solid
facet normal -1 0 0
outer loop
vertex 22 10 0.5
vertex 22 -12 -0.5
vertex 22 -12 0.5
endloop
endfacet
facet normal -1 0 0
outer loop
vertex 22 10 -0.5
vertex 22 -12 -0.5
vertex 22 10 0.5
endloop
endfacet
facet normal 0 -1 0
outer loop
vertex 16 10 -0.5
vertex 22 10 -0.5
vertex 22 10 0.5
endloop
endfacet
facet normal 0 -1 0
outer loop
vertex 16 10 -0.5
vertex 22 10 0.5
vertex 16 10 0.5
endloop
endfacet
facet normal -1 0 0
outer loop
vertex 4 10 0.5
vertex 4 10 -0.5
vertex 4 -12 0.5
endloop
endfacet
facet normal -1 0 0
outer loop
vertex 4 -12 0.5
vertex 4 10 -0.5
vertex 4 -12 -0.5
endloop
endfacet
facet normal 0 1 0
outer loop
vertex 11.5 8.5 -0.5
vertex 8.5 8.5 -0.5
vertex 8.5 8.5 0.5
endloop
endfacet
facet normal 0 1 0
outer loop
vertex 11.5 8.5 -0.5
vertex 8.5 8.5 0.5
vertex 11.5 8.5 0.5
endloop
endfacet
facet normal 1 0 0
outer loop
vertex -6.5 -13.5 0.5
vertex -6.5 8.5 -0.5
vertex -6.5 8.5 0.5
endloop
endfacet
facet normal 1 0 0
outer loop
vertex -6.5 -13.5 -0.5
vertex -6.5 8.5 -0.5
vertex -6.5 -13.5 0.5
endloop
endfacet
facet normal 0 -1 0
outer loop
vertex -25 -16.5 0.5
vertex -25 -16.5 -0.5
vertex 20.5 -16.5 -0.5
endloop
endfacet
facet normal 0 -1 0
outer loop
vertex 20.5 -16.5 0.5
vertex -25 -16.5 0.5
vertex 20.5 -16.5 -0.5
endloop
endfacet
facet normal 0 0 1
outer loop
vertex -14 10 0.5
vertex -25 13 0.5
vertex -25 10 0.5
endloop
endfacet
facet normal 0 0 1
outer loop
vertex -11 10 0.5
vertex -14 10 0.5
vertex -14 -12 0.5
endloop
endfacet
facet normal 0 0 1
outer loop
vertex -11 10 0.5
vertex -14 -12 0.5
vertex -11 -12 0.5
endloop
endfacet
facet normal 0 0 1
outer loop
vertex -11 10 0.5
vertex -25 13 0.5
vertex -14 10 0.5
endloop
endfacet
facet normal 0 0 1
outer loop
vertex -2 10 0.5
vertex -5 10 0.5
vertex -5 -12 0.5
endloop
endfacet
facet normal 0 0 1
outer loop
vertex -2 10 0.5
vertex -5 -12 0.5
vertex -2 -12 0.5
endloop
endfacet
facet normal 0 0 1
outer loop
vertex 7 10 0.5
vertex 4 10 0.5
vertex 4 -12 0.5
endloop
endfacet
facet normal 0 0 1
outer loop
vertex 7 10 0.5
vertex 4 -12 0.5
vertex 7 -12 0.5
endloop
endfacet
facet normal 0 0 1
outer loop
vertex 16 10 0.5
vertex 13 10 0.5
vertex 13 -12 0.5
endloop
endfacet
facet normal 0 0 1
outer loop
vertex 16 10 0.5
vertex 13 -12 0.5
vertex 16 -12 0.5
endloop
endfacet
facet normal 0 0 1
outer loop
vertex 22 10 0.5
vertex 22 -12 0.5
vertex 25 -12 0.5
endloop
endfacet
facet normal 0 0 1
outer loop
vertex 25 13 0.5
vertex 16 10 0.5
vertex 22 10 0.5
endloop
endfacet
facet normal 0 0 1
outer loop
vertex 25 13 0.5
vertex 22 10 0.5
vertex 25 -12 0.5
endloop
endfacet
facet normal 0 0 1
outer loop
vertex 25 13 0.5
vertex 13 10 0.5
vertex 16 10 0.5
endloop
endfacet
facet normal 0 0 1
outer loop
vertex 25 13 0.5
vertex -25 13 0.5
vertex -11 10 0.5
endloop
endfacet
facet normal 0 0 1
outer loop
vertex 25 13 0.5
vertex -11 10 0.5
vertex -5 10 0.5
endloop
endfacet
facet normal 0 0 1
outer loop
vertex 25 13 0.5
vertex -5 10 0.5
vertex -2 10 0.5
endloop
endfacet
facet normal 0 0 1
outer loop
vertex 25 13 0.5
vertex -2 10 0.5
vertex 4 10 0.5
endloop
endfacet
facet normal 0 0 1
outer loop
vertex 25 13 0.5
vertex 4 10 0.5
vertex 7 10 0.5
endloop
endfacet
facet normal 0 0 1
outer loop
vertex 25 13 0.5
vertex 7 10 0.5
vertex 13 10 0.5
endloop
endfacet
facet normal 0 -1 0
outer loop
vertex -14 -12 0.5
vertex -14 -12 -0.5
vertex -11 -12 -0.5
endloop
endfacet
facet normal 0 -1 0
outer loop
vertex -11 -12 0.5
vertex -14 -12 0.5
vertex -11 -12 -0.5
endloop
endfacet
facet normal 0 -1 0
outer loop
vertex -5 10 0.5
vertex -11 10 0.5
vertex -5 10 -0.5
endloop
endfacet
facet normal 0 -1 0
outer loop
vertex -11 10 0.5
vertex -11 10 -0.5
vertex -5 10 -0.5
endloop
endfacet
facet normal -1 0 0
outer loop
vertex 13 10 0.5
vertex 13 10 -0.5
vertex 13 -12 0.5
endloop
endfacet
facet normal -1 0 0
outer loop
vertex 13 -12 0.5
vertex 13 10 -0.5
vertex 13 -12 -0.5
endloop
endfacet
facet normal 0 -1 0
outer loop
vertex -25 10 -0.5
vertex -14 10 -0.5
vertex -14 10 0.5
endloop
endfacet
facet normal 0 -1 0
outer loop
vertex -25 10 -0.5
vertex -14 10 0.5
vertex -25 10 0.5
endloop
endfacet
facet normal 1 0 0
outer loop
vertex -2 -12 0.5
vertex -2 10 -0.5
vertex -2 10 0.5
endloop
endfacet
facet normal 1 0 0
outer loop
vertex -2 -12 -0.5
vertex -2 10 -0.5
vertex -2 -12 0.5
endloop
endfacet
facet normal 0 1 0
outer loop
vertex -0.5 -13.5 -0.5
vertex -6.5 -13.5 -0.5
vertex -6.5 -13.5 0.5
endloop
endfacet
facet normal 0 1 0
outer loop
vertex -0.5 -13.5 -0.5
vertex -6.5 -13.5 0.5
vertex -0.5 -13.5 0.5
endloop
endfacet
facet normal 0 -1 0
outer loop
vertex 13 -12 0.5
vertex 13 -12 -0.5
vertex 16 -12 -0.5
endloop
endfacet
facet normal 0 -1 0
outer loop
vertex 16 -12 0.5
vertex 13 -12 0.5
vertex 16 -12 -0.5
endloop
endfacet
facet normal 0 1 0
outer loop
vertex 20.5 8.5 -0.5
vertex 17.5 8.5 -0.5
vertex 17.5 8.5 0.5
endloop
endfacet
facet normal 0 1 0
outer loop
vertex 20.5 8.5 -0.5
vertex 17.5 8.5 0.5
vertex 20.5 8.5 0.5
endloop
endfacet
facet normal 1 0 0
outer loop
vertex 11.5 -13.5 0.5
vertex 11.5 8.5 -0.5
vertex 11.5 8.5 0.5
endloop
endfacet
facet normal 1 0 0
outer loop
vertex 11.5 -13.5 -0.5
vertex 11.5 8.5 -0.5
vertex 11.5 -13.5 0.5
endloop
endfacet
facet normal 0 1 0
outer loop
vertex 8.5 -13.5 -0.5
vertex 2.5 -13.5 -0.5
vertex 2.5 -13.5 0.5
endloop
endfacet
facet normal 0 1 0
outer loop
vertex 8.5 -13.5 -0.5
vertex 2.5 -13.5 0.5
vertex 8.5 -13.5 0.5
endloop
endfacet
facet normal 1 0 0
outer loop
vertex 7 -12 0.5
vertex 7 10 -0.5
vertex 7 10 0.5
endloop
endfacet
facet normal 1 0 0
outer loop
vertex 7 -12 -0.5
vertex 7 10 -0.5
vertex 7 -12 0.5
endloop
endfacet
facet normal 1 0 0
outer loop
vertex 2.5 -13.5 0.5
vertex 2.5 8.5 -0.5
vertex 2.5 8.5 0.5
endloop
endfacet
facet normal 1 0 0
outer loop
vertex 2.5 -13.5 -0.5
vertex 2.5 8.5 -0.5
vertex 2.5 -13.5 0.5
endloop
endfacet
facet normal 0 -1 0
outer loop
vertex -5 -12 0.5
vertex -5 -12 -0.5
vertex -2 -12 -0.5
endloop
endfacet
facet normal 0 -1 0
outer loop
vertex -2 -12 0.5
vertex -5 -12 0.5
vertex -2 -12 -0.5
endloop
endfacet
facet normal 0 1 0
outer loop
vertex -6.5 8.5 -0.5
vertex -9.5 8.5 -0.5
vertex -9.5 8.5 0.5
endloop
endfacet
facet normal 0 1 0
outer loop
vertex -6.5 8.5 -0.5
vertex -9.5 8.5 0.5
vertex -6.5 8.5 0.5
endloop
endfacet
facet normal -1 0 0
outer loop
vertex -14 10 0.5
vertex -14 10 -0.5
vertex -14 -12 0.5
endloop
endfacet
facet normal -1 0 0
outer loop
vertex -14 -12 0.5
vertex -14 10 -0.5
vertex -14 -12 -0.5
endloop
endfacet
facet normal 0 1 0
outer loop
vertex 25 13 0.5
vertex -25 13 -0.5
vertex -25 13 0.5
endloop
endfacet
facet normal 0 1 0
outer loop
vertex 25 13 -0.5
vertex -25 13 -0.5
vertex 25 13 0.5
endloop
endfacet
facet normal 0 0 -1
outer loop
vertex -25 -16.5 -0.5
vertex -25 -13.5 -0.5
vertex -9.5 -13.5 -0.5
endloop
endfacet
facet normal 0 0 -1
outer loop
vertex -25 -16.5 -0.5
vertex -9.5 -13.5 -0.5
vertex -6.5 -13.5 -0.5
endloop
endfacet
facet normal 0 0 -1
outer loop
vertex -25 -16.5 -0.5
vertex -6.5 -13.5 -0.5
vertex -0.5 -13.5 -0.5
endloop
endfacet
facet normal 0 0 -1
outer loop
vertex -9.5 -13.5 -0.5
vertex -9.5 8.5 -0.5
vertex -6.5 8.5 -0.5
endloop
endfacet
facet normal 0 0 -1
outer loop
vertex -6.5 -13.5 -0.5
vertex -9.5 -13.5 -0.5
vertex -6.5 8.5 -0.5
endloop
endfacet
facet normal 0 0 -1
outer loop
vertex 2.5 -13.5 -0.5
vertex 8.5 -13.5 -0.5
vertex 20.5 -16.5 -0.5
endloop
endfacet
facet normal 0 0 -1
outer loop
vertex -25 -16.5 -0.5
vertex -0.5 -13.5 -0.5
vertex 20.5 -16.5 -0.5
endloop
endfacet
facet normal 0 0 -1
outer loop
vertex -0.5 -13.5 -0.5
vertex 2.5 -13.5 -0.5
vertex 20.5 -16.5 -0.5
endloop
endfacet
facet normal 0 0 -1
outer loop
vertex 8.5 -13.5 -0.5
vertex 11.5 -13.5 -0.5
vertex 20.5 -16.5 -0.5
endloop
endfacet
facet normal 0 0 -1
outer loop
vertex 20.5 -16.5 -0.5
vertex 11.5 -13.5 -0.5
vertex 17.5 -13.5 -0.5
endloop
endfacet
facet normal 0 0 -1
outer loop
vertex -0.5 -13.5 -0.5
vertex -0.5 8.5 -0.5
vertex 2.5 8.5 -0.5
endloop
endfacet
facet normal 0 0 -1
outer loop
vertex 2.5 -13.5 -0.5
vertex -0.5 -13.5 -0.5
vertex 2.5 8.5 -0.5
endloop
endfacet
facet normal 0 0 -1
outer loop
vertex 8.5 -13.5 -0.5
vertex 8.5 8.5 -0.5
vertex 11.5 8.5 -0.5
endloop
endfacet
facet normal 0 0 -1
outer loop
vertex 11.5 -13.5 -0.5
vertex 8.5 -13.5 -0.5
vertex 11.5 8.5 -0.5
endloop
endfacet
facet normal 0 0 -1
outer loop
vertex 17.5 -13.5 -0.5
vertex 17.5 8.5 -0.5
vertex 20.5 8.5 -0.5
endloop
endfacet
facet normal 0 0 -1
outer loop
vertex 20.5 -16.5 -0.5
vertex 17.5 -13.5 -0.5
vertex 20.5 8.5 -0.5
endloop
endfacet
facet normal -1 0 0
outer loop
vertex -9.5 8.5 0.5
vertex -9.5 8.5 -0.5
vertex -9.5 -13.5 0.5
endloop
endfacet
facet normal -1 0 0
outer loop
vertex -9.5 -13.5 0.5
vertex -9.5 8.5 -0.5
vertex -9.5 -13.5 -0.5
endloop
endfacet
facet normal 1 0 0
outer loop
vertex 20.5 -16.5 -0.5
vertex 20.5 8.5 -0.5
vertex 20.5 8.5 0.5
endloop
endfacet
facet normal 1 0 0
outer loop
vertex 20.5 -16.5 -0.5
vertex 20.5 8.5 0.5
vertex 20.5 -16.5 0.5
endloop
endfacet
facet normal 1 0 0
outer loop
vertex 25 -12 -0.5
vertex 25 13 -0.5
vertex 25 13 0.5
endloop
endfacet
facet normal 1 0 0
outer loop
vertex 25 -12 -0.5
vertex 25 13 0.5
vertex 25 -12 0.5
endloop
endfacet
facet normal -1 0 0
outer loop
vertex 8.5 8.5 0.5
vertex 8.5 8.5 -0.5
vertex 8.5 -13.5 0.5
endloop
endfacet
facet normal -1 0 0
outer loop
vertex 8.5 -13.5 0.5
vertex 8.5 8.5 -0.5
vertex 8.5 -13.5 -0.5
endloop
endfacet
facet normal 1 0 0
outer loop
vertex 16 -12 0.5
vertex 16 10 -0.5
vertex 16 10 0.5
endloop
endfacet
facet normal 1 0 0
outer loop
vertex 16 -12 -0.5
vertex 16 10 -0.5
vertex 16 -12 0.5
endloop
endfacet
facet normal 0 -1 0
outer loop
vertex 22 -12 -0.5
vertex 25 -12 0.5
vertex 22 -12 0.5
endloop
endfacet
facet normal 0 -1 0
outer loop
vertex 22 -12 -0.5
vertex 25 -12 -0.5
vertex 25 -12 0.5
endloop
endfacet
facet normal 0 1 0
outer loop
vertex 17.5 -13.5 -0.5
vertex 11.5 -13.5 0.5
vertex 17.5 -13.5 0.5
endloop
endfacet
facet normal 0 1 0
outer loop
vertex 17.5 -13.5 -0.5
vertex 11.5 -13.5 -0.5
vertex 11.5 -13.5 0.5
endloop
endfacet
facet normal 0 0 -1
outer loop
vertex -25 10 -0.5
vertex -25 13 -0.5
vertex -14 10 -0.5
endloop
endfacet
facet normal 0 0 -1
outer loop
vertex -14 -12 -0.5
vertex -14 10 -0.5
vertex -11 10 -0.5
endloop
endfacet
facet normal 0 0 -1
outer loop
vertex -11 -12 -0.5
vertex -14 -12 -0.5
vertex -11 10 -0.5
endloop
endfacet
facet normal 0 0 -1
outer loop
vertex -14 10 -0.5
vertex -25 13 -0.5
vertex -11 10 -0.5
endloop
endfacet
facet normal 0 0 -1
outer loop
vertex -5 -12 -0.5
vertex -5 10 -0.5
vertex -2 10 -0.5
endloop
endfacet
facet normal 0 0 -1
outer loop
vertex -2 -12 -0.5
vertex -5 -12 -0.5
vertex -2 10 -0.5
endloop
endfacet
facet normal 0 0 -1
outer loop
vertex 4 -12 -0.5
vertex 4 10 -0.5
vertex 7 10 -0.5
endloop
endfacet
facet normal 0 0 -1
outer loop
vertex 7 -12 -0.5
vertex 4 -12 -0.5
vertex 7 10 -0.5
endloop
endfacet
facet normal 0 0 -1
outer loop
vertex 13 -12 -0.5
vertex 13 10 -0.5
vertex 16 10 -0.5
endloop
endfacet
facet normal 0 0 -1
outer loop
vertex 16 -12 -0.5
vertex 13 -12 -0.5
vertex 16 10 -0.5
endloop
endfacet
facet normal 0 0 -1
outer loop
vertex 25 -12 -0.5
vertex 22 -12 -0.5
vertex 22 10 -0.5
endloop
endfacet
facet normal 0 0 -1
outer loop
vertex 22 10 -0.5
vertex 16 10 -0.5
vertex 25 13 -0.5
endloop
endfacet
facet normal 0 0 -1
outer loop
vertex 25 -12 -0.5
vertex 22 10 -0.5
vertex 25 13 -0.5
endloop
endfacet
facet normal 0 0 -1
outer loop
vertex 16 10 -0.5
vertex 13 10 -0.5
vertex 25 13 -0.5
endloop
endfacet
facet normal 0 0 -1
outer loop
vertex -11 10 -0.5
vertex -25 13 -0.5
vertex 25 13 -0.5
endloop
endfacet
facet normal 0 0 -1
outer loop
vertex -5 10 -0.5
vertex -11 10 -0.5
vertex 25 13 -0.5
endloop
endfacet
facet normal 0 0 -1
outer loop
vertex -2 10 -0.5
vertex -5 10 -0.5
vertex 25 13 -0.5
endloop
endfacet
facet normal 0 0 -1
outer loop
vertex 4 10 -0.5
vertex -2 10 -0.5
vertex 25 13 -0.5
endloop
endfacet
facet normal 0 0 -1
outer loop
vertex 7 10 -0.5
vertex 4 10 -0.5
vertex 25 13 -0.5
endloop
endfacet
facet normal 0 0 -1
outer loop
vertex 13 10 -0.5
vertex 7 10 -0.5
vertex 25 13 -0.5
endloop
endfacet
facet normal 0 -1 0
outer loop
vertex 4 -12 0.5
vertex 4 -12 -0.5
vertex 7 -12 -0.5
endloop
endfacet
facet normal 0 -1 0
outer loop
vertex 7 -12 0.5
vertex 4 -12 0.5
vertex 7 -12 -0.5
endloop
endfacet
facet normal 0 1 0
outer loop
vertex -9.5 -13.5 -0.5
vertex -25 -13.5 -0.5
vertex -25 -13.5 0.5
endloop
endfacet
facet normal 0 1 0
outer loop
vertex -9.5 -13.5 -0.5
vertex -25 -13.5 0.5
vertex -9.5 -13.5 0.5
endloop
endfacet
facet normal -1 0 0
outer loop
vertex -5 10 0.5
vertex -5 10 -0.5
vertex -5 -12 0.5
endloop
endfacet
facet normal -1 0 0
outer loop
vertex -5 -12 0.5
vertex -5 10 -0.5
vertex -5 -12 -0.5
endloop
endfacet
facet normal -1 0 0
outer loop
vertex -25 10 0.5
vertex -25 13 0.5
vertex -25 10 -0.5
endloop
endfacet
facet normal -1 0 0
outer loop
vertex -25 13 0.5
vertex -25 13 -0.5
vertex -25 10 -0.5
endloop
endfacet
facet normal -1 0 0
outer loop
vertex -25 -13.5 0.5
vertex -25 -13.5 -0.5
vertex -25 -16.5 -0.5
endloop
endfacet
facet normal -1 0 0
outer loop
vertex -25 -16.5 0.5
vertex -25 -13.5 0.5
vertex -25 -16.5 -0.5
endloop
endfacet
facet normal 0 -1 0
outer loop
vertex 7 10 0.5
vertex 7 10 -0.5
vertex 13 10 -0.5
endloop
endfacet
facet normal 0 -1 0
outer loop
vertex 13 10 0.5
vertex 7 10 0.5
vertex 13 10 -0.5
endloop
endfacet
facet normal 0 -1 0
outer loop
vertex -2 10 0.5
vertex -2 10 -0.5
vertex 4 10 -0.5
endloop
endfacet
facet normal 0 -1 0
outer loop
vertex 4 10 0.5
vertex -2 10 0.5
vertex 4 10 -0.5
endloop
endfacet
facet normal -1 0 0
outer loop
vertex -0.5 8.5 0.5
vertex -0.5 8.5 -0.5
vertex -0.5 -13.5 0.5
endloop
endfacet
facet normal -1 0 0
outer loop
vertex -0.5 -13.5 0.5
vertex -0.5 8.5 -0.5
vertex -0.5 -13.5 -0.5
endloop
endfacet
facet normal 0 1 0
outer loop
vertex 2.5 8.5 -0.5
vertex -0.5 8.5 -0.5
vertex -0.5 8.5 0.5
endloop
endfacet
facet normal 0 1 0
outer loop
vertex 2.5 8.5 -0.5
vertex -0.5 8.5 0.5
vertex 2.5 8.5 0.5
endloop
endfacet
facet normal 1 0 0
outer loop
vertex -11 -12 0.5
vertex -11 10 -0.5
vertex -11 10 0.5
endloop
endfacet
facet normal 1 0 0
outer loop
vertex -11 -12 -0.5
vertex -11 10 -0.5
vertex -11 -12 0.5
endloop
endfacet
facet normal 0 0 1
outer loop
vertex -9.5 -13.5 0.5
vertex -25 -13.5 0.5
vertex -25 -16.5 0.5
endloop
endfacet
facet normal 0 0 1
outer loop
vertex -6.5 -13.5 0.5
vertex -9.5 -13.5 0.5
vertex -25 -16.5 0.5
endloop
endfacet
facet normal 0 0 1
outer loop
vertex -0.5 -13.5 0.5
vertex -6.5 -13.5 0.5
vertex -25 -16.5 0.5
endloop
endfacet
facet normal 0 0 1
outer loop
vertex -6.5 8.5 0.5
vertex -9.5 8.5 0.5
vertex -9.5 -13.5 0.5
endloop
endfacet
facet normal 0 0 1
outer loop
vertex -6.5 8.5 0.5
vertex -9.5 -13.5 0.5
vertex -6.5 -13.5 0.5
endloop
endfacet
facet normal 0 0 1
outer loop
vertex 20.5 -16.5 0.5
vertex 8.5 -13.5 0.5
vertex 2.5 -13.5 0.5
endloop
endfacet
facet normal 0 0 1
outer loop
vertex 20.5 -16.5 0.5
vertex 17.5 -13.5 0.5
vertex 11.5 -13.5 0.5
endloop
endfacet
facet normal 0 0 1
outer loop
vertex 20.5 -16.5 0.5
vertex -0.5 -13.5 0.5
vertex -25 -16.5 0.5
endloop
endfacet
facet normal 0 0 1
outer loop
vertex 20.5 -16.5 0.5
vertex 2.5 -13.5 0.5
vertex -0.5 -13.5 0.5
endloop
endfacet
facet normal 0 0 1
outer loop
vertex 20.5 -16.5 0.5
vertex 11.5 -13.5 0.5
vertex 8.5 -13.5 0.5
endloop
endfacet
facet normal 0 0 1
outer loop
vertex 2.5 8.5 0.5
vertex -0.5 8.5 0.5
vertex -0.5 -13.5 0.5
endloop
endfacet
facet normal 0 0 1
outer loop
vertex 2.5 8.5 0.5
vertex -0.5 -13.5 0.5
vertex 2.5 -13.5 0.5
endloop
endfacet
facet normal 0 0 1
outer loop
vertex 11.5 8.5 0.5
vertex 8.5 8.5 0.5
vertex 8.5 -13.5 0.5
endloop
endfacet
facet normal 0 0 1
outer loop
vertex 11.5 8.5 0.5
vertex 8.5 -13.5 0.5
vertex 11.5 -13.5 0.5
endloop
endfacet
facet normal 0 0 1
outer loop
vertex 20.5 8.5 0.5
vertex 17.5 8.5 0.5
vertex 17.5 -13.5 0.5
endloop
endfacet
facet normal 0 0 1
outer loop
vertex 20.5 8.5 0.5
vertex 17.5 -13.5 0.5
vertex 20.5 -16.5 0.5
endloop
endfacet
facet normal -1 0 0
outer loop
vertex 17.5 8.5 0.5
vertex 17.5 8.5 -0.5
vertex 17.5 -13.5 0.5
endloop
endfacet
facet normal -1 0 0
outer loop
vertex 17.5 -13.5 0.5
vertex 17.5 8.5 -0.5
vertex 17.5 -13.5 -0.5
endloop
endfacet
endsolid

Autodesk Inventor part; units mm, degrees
ref_plane "YZ Plane" through (0, 0, 0) normal (1, 0, 0) x (0, 1, 0)
ref_plane "XZ Plane" through (0, 0, 0) normal (0, 1, 0) x (-1, 0, 0)
ref_plane "XY Plane" through (0, 0, 0) normal (0, 0, 1) x (1, 0, 0)
sketch "Esboço1" plane through (0, 0, 0) normal (0, 0, 1) x (1, 0, 0)
  line L0 (-25, 13) -> (-25, 10)
  line L1 (-25, 13) -> (25, 13)
  line L2 (25, 13) -> (25, -12)
  line L3 (25, -12) -> (22, -12)
  line L4 (22, -12) -> (22, 10)
  line L5 (22, 10) -> (16, 10)
  line L6 (-14, 10) -> (-25, 10)
  line L7 (-25, -13.5) -> (-9.5, -13.5)
  line L8 (-9.5, 8.5) -> (-9.5, -13.5)
  line L9 (-9.5, 8.5) -> (-6.5, 8.5)
  line L10 (-6.5, 8.5) -> (-6.5, -13.5)
  line L11 (-6.5, -13.5) -> (-0.5, -13.5)
  line L12 (-0.5, 8.5) -> (-0.5, -13.5)
  line L13 (-0.5, 8.5) -> (2.5, 8.5)
  line L14 (2.5, 8.5) -> (2.5, -13.5)
  line L15 (2.5, -13.5) -> (8.5, -13.5)
  line L16 (8.5, 8.5) -> (8.5, -13.5)
  line L17 (8.5, 8.5) -> (11.5, 8.5)
  line L18 (11.5, 8.5) -> (11.5, -13.5)
  line L19 (11.5, -13.5) -> (17.5, -13.5)
  line L20 (17.5, 8.5) -> (17.5, -13.5)
  line L21 (17.5, 8.5) -> (20.5, 8.5)
  line L22 (20.5, 8.5) -> (20.5, -13.5)
  line L23 (-25, -13.5) -> (-25, -16.5)
  line L24 (20.5, -13.5) -> (20.5, -16.5)
  line L25 (-25, -16.5) -> (20.5, -16.5)
  line L26 (16, 10) -> (16, -12)
  line L27 (13, -12) -> (16, -12)
  line L28 (13, 10) -> (13, -12)
  line L29 (7, 10) -> (13, 10)
  line L30 (7, 10) -> (7, -12)
  line L31 (4, -12) -> (7, -12)
  line L32 (4, 10) -> (4, -12)
  line L33 (-2, 10) -> (4, 10)
  line L34 (-2, 10) -> (-2, -12)
  line L35 (-5, -12) -> (-2, -12)
  line L36 (-5, 10) -> (-5, -12)
  line L37 (-11, 10) -> (-5, 10)
  line L38 (-11, 10) -> (-11, -12)
  line L39 (-14, -12) -> (-11, -12)
  line L40 (-14, 10) -> (-14, -12)
  point P0 (0, 0)
  point P1 (-25, 11.5)
  point P2 (0, 13)
  point P3 (23.5, -12)
  point P4 (-8, 8.5)
  point P5 (-3.5, -13.5)
  point P6 (-3.5, -12)
  dimension "d0" = 10
  dimension "d2" = 3
  dimension "d3" = 50
  dimension "d4" = 25
  dimension "d5" = 3
  dimension "d14" = 6
  dimension "d22" = 3
  dimension "d31" = 1.5
  dimension "d34" = 3
  dimension "d37" = 1.5
  dimension "d38" = 1.5
  dimension "d40" = 11
extrude "Extrusão1" add sketch "Esboço1" along normal mid plane 1
properties part number "sensor_001_001"
